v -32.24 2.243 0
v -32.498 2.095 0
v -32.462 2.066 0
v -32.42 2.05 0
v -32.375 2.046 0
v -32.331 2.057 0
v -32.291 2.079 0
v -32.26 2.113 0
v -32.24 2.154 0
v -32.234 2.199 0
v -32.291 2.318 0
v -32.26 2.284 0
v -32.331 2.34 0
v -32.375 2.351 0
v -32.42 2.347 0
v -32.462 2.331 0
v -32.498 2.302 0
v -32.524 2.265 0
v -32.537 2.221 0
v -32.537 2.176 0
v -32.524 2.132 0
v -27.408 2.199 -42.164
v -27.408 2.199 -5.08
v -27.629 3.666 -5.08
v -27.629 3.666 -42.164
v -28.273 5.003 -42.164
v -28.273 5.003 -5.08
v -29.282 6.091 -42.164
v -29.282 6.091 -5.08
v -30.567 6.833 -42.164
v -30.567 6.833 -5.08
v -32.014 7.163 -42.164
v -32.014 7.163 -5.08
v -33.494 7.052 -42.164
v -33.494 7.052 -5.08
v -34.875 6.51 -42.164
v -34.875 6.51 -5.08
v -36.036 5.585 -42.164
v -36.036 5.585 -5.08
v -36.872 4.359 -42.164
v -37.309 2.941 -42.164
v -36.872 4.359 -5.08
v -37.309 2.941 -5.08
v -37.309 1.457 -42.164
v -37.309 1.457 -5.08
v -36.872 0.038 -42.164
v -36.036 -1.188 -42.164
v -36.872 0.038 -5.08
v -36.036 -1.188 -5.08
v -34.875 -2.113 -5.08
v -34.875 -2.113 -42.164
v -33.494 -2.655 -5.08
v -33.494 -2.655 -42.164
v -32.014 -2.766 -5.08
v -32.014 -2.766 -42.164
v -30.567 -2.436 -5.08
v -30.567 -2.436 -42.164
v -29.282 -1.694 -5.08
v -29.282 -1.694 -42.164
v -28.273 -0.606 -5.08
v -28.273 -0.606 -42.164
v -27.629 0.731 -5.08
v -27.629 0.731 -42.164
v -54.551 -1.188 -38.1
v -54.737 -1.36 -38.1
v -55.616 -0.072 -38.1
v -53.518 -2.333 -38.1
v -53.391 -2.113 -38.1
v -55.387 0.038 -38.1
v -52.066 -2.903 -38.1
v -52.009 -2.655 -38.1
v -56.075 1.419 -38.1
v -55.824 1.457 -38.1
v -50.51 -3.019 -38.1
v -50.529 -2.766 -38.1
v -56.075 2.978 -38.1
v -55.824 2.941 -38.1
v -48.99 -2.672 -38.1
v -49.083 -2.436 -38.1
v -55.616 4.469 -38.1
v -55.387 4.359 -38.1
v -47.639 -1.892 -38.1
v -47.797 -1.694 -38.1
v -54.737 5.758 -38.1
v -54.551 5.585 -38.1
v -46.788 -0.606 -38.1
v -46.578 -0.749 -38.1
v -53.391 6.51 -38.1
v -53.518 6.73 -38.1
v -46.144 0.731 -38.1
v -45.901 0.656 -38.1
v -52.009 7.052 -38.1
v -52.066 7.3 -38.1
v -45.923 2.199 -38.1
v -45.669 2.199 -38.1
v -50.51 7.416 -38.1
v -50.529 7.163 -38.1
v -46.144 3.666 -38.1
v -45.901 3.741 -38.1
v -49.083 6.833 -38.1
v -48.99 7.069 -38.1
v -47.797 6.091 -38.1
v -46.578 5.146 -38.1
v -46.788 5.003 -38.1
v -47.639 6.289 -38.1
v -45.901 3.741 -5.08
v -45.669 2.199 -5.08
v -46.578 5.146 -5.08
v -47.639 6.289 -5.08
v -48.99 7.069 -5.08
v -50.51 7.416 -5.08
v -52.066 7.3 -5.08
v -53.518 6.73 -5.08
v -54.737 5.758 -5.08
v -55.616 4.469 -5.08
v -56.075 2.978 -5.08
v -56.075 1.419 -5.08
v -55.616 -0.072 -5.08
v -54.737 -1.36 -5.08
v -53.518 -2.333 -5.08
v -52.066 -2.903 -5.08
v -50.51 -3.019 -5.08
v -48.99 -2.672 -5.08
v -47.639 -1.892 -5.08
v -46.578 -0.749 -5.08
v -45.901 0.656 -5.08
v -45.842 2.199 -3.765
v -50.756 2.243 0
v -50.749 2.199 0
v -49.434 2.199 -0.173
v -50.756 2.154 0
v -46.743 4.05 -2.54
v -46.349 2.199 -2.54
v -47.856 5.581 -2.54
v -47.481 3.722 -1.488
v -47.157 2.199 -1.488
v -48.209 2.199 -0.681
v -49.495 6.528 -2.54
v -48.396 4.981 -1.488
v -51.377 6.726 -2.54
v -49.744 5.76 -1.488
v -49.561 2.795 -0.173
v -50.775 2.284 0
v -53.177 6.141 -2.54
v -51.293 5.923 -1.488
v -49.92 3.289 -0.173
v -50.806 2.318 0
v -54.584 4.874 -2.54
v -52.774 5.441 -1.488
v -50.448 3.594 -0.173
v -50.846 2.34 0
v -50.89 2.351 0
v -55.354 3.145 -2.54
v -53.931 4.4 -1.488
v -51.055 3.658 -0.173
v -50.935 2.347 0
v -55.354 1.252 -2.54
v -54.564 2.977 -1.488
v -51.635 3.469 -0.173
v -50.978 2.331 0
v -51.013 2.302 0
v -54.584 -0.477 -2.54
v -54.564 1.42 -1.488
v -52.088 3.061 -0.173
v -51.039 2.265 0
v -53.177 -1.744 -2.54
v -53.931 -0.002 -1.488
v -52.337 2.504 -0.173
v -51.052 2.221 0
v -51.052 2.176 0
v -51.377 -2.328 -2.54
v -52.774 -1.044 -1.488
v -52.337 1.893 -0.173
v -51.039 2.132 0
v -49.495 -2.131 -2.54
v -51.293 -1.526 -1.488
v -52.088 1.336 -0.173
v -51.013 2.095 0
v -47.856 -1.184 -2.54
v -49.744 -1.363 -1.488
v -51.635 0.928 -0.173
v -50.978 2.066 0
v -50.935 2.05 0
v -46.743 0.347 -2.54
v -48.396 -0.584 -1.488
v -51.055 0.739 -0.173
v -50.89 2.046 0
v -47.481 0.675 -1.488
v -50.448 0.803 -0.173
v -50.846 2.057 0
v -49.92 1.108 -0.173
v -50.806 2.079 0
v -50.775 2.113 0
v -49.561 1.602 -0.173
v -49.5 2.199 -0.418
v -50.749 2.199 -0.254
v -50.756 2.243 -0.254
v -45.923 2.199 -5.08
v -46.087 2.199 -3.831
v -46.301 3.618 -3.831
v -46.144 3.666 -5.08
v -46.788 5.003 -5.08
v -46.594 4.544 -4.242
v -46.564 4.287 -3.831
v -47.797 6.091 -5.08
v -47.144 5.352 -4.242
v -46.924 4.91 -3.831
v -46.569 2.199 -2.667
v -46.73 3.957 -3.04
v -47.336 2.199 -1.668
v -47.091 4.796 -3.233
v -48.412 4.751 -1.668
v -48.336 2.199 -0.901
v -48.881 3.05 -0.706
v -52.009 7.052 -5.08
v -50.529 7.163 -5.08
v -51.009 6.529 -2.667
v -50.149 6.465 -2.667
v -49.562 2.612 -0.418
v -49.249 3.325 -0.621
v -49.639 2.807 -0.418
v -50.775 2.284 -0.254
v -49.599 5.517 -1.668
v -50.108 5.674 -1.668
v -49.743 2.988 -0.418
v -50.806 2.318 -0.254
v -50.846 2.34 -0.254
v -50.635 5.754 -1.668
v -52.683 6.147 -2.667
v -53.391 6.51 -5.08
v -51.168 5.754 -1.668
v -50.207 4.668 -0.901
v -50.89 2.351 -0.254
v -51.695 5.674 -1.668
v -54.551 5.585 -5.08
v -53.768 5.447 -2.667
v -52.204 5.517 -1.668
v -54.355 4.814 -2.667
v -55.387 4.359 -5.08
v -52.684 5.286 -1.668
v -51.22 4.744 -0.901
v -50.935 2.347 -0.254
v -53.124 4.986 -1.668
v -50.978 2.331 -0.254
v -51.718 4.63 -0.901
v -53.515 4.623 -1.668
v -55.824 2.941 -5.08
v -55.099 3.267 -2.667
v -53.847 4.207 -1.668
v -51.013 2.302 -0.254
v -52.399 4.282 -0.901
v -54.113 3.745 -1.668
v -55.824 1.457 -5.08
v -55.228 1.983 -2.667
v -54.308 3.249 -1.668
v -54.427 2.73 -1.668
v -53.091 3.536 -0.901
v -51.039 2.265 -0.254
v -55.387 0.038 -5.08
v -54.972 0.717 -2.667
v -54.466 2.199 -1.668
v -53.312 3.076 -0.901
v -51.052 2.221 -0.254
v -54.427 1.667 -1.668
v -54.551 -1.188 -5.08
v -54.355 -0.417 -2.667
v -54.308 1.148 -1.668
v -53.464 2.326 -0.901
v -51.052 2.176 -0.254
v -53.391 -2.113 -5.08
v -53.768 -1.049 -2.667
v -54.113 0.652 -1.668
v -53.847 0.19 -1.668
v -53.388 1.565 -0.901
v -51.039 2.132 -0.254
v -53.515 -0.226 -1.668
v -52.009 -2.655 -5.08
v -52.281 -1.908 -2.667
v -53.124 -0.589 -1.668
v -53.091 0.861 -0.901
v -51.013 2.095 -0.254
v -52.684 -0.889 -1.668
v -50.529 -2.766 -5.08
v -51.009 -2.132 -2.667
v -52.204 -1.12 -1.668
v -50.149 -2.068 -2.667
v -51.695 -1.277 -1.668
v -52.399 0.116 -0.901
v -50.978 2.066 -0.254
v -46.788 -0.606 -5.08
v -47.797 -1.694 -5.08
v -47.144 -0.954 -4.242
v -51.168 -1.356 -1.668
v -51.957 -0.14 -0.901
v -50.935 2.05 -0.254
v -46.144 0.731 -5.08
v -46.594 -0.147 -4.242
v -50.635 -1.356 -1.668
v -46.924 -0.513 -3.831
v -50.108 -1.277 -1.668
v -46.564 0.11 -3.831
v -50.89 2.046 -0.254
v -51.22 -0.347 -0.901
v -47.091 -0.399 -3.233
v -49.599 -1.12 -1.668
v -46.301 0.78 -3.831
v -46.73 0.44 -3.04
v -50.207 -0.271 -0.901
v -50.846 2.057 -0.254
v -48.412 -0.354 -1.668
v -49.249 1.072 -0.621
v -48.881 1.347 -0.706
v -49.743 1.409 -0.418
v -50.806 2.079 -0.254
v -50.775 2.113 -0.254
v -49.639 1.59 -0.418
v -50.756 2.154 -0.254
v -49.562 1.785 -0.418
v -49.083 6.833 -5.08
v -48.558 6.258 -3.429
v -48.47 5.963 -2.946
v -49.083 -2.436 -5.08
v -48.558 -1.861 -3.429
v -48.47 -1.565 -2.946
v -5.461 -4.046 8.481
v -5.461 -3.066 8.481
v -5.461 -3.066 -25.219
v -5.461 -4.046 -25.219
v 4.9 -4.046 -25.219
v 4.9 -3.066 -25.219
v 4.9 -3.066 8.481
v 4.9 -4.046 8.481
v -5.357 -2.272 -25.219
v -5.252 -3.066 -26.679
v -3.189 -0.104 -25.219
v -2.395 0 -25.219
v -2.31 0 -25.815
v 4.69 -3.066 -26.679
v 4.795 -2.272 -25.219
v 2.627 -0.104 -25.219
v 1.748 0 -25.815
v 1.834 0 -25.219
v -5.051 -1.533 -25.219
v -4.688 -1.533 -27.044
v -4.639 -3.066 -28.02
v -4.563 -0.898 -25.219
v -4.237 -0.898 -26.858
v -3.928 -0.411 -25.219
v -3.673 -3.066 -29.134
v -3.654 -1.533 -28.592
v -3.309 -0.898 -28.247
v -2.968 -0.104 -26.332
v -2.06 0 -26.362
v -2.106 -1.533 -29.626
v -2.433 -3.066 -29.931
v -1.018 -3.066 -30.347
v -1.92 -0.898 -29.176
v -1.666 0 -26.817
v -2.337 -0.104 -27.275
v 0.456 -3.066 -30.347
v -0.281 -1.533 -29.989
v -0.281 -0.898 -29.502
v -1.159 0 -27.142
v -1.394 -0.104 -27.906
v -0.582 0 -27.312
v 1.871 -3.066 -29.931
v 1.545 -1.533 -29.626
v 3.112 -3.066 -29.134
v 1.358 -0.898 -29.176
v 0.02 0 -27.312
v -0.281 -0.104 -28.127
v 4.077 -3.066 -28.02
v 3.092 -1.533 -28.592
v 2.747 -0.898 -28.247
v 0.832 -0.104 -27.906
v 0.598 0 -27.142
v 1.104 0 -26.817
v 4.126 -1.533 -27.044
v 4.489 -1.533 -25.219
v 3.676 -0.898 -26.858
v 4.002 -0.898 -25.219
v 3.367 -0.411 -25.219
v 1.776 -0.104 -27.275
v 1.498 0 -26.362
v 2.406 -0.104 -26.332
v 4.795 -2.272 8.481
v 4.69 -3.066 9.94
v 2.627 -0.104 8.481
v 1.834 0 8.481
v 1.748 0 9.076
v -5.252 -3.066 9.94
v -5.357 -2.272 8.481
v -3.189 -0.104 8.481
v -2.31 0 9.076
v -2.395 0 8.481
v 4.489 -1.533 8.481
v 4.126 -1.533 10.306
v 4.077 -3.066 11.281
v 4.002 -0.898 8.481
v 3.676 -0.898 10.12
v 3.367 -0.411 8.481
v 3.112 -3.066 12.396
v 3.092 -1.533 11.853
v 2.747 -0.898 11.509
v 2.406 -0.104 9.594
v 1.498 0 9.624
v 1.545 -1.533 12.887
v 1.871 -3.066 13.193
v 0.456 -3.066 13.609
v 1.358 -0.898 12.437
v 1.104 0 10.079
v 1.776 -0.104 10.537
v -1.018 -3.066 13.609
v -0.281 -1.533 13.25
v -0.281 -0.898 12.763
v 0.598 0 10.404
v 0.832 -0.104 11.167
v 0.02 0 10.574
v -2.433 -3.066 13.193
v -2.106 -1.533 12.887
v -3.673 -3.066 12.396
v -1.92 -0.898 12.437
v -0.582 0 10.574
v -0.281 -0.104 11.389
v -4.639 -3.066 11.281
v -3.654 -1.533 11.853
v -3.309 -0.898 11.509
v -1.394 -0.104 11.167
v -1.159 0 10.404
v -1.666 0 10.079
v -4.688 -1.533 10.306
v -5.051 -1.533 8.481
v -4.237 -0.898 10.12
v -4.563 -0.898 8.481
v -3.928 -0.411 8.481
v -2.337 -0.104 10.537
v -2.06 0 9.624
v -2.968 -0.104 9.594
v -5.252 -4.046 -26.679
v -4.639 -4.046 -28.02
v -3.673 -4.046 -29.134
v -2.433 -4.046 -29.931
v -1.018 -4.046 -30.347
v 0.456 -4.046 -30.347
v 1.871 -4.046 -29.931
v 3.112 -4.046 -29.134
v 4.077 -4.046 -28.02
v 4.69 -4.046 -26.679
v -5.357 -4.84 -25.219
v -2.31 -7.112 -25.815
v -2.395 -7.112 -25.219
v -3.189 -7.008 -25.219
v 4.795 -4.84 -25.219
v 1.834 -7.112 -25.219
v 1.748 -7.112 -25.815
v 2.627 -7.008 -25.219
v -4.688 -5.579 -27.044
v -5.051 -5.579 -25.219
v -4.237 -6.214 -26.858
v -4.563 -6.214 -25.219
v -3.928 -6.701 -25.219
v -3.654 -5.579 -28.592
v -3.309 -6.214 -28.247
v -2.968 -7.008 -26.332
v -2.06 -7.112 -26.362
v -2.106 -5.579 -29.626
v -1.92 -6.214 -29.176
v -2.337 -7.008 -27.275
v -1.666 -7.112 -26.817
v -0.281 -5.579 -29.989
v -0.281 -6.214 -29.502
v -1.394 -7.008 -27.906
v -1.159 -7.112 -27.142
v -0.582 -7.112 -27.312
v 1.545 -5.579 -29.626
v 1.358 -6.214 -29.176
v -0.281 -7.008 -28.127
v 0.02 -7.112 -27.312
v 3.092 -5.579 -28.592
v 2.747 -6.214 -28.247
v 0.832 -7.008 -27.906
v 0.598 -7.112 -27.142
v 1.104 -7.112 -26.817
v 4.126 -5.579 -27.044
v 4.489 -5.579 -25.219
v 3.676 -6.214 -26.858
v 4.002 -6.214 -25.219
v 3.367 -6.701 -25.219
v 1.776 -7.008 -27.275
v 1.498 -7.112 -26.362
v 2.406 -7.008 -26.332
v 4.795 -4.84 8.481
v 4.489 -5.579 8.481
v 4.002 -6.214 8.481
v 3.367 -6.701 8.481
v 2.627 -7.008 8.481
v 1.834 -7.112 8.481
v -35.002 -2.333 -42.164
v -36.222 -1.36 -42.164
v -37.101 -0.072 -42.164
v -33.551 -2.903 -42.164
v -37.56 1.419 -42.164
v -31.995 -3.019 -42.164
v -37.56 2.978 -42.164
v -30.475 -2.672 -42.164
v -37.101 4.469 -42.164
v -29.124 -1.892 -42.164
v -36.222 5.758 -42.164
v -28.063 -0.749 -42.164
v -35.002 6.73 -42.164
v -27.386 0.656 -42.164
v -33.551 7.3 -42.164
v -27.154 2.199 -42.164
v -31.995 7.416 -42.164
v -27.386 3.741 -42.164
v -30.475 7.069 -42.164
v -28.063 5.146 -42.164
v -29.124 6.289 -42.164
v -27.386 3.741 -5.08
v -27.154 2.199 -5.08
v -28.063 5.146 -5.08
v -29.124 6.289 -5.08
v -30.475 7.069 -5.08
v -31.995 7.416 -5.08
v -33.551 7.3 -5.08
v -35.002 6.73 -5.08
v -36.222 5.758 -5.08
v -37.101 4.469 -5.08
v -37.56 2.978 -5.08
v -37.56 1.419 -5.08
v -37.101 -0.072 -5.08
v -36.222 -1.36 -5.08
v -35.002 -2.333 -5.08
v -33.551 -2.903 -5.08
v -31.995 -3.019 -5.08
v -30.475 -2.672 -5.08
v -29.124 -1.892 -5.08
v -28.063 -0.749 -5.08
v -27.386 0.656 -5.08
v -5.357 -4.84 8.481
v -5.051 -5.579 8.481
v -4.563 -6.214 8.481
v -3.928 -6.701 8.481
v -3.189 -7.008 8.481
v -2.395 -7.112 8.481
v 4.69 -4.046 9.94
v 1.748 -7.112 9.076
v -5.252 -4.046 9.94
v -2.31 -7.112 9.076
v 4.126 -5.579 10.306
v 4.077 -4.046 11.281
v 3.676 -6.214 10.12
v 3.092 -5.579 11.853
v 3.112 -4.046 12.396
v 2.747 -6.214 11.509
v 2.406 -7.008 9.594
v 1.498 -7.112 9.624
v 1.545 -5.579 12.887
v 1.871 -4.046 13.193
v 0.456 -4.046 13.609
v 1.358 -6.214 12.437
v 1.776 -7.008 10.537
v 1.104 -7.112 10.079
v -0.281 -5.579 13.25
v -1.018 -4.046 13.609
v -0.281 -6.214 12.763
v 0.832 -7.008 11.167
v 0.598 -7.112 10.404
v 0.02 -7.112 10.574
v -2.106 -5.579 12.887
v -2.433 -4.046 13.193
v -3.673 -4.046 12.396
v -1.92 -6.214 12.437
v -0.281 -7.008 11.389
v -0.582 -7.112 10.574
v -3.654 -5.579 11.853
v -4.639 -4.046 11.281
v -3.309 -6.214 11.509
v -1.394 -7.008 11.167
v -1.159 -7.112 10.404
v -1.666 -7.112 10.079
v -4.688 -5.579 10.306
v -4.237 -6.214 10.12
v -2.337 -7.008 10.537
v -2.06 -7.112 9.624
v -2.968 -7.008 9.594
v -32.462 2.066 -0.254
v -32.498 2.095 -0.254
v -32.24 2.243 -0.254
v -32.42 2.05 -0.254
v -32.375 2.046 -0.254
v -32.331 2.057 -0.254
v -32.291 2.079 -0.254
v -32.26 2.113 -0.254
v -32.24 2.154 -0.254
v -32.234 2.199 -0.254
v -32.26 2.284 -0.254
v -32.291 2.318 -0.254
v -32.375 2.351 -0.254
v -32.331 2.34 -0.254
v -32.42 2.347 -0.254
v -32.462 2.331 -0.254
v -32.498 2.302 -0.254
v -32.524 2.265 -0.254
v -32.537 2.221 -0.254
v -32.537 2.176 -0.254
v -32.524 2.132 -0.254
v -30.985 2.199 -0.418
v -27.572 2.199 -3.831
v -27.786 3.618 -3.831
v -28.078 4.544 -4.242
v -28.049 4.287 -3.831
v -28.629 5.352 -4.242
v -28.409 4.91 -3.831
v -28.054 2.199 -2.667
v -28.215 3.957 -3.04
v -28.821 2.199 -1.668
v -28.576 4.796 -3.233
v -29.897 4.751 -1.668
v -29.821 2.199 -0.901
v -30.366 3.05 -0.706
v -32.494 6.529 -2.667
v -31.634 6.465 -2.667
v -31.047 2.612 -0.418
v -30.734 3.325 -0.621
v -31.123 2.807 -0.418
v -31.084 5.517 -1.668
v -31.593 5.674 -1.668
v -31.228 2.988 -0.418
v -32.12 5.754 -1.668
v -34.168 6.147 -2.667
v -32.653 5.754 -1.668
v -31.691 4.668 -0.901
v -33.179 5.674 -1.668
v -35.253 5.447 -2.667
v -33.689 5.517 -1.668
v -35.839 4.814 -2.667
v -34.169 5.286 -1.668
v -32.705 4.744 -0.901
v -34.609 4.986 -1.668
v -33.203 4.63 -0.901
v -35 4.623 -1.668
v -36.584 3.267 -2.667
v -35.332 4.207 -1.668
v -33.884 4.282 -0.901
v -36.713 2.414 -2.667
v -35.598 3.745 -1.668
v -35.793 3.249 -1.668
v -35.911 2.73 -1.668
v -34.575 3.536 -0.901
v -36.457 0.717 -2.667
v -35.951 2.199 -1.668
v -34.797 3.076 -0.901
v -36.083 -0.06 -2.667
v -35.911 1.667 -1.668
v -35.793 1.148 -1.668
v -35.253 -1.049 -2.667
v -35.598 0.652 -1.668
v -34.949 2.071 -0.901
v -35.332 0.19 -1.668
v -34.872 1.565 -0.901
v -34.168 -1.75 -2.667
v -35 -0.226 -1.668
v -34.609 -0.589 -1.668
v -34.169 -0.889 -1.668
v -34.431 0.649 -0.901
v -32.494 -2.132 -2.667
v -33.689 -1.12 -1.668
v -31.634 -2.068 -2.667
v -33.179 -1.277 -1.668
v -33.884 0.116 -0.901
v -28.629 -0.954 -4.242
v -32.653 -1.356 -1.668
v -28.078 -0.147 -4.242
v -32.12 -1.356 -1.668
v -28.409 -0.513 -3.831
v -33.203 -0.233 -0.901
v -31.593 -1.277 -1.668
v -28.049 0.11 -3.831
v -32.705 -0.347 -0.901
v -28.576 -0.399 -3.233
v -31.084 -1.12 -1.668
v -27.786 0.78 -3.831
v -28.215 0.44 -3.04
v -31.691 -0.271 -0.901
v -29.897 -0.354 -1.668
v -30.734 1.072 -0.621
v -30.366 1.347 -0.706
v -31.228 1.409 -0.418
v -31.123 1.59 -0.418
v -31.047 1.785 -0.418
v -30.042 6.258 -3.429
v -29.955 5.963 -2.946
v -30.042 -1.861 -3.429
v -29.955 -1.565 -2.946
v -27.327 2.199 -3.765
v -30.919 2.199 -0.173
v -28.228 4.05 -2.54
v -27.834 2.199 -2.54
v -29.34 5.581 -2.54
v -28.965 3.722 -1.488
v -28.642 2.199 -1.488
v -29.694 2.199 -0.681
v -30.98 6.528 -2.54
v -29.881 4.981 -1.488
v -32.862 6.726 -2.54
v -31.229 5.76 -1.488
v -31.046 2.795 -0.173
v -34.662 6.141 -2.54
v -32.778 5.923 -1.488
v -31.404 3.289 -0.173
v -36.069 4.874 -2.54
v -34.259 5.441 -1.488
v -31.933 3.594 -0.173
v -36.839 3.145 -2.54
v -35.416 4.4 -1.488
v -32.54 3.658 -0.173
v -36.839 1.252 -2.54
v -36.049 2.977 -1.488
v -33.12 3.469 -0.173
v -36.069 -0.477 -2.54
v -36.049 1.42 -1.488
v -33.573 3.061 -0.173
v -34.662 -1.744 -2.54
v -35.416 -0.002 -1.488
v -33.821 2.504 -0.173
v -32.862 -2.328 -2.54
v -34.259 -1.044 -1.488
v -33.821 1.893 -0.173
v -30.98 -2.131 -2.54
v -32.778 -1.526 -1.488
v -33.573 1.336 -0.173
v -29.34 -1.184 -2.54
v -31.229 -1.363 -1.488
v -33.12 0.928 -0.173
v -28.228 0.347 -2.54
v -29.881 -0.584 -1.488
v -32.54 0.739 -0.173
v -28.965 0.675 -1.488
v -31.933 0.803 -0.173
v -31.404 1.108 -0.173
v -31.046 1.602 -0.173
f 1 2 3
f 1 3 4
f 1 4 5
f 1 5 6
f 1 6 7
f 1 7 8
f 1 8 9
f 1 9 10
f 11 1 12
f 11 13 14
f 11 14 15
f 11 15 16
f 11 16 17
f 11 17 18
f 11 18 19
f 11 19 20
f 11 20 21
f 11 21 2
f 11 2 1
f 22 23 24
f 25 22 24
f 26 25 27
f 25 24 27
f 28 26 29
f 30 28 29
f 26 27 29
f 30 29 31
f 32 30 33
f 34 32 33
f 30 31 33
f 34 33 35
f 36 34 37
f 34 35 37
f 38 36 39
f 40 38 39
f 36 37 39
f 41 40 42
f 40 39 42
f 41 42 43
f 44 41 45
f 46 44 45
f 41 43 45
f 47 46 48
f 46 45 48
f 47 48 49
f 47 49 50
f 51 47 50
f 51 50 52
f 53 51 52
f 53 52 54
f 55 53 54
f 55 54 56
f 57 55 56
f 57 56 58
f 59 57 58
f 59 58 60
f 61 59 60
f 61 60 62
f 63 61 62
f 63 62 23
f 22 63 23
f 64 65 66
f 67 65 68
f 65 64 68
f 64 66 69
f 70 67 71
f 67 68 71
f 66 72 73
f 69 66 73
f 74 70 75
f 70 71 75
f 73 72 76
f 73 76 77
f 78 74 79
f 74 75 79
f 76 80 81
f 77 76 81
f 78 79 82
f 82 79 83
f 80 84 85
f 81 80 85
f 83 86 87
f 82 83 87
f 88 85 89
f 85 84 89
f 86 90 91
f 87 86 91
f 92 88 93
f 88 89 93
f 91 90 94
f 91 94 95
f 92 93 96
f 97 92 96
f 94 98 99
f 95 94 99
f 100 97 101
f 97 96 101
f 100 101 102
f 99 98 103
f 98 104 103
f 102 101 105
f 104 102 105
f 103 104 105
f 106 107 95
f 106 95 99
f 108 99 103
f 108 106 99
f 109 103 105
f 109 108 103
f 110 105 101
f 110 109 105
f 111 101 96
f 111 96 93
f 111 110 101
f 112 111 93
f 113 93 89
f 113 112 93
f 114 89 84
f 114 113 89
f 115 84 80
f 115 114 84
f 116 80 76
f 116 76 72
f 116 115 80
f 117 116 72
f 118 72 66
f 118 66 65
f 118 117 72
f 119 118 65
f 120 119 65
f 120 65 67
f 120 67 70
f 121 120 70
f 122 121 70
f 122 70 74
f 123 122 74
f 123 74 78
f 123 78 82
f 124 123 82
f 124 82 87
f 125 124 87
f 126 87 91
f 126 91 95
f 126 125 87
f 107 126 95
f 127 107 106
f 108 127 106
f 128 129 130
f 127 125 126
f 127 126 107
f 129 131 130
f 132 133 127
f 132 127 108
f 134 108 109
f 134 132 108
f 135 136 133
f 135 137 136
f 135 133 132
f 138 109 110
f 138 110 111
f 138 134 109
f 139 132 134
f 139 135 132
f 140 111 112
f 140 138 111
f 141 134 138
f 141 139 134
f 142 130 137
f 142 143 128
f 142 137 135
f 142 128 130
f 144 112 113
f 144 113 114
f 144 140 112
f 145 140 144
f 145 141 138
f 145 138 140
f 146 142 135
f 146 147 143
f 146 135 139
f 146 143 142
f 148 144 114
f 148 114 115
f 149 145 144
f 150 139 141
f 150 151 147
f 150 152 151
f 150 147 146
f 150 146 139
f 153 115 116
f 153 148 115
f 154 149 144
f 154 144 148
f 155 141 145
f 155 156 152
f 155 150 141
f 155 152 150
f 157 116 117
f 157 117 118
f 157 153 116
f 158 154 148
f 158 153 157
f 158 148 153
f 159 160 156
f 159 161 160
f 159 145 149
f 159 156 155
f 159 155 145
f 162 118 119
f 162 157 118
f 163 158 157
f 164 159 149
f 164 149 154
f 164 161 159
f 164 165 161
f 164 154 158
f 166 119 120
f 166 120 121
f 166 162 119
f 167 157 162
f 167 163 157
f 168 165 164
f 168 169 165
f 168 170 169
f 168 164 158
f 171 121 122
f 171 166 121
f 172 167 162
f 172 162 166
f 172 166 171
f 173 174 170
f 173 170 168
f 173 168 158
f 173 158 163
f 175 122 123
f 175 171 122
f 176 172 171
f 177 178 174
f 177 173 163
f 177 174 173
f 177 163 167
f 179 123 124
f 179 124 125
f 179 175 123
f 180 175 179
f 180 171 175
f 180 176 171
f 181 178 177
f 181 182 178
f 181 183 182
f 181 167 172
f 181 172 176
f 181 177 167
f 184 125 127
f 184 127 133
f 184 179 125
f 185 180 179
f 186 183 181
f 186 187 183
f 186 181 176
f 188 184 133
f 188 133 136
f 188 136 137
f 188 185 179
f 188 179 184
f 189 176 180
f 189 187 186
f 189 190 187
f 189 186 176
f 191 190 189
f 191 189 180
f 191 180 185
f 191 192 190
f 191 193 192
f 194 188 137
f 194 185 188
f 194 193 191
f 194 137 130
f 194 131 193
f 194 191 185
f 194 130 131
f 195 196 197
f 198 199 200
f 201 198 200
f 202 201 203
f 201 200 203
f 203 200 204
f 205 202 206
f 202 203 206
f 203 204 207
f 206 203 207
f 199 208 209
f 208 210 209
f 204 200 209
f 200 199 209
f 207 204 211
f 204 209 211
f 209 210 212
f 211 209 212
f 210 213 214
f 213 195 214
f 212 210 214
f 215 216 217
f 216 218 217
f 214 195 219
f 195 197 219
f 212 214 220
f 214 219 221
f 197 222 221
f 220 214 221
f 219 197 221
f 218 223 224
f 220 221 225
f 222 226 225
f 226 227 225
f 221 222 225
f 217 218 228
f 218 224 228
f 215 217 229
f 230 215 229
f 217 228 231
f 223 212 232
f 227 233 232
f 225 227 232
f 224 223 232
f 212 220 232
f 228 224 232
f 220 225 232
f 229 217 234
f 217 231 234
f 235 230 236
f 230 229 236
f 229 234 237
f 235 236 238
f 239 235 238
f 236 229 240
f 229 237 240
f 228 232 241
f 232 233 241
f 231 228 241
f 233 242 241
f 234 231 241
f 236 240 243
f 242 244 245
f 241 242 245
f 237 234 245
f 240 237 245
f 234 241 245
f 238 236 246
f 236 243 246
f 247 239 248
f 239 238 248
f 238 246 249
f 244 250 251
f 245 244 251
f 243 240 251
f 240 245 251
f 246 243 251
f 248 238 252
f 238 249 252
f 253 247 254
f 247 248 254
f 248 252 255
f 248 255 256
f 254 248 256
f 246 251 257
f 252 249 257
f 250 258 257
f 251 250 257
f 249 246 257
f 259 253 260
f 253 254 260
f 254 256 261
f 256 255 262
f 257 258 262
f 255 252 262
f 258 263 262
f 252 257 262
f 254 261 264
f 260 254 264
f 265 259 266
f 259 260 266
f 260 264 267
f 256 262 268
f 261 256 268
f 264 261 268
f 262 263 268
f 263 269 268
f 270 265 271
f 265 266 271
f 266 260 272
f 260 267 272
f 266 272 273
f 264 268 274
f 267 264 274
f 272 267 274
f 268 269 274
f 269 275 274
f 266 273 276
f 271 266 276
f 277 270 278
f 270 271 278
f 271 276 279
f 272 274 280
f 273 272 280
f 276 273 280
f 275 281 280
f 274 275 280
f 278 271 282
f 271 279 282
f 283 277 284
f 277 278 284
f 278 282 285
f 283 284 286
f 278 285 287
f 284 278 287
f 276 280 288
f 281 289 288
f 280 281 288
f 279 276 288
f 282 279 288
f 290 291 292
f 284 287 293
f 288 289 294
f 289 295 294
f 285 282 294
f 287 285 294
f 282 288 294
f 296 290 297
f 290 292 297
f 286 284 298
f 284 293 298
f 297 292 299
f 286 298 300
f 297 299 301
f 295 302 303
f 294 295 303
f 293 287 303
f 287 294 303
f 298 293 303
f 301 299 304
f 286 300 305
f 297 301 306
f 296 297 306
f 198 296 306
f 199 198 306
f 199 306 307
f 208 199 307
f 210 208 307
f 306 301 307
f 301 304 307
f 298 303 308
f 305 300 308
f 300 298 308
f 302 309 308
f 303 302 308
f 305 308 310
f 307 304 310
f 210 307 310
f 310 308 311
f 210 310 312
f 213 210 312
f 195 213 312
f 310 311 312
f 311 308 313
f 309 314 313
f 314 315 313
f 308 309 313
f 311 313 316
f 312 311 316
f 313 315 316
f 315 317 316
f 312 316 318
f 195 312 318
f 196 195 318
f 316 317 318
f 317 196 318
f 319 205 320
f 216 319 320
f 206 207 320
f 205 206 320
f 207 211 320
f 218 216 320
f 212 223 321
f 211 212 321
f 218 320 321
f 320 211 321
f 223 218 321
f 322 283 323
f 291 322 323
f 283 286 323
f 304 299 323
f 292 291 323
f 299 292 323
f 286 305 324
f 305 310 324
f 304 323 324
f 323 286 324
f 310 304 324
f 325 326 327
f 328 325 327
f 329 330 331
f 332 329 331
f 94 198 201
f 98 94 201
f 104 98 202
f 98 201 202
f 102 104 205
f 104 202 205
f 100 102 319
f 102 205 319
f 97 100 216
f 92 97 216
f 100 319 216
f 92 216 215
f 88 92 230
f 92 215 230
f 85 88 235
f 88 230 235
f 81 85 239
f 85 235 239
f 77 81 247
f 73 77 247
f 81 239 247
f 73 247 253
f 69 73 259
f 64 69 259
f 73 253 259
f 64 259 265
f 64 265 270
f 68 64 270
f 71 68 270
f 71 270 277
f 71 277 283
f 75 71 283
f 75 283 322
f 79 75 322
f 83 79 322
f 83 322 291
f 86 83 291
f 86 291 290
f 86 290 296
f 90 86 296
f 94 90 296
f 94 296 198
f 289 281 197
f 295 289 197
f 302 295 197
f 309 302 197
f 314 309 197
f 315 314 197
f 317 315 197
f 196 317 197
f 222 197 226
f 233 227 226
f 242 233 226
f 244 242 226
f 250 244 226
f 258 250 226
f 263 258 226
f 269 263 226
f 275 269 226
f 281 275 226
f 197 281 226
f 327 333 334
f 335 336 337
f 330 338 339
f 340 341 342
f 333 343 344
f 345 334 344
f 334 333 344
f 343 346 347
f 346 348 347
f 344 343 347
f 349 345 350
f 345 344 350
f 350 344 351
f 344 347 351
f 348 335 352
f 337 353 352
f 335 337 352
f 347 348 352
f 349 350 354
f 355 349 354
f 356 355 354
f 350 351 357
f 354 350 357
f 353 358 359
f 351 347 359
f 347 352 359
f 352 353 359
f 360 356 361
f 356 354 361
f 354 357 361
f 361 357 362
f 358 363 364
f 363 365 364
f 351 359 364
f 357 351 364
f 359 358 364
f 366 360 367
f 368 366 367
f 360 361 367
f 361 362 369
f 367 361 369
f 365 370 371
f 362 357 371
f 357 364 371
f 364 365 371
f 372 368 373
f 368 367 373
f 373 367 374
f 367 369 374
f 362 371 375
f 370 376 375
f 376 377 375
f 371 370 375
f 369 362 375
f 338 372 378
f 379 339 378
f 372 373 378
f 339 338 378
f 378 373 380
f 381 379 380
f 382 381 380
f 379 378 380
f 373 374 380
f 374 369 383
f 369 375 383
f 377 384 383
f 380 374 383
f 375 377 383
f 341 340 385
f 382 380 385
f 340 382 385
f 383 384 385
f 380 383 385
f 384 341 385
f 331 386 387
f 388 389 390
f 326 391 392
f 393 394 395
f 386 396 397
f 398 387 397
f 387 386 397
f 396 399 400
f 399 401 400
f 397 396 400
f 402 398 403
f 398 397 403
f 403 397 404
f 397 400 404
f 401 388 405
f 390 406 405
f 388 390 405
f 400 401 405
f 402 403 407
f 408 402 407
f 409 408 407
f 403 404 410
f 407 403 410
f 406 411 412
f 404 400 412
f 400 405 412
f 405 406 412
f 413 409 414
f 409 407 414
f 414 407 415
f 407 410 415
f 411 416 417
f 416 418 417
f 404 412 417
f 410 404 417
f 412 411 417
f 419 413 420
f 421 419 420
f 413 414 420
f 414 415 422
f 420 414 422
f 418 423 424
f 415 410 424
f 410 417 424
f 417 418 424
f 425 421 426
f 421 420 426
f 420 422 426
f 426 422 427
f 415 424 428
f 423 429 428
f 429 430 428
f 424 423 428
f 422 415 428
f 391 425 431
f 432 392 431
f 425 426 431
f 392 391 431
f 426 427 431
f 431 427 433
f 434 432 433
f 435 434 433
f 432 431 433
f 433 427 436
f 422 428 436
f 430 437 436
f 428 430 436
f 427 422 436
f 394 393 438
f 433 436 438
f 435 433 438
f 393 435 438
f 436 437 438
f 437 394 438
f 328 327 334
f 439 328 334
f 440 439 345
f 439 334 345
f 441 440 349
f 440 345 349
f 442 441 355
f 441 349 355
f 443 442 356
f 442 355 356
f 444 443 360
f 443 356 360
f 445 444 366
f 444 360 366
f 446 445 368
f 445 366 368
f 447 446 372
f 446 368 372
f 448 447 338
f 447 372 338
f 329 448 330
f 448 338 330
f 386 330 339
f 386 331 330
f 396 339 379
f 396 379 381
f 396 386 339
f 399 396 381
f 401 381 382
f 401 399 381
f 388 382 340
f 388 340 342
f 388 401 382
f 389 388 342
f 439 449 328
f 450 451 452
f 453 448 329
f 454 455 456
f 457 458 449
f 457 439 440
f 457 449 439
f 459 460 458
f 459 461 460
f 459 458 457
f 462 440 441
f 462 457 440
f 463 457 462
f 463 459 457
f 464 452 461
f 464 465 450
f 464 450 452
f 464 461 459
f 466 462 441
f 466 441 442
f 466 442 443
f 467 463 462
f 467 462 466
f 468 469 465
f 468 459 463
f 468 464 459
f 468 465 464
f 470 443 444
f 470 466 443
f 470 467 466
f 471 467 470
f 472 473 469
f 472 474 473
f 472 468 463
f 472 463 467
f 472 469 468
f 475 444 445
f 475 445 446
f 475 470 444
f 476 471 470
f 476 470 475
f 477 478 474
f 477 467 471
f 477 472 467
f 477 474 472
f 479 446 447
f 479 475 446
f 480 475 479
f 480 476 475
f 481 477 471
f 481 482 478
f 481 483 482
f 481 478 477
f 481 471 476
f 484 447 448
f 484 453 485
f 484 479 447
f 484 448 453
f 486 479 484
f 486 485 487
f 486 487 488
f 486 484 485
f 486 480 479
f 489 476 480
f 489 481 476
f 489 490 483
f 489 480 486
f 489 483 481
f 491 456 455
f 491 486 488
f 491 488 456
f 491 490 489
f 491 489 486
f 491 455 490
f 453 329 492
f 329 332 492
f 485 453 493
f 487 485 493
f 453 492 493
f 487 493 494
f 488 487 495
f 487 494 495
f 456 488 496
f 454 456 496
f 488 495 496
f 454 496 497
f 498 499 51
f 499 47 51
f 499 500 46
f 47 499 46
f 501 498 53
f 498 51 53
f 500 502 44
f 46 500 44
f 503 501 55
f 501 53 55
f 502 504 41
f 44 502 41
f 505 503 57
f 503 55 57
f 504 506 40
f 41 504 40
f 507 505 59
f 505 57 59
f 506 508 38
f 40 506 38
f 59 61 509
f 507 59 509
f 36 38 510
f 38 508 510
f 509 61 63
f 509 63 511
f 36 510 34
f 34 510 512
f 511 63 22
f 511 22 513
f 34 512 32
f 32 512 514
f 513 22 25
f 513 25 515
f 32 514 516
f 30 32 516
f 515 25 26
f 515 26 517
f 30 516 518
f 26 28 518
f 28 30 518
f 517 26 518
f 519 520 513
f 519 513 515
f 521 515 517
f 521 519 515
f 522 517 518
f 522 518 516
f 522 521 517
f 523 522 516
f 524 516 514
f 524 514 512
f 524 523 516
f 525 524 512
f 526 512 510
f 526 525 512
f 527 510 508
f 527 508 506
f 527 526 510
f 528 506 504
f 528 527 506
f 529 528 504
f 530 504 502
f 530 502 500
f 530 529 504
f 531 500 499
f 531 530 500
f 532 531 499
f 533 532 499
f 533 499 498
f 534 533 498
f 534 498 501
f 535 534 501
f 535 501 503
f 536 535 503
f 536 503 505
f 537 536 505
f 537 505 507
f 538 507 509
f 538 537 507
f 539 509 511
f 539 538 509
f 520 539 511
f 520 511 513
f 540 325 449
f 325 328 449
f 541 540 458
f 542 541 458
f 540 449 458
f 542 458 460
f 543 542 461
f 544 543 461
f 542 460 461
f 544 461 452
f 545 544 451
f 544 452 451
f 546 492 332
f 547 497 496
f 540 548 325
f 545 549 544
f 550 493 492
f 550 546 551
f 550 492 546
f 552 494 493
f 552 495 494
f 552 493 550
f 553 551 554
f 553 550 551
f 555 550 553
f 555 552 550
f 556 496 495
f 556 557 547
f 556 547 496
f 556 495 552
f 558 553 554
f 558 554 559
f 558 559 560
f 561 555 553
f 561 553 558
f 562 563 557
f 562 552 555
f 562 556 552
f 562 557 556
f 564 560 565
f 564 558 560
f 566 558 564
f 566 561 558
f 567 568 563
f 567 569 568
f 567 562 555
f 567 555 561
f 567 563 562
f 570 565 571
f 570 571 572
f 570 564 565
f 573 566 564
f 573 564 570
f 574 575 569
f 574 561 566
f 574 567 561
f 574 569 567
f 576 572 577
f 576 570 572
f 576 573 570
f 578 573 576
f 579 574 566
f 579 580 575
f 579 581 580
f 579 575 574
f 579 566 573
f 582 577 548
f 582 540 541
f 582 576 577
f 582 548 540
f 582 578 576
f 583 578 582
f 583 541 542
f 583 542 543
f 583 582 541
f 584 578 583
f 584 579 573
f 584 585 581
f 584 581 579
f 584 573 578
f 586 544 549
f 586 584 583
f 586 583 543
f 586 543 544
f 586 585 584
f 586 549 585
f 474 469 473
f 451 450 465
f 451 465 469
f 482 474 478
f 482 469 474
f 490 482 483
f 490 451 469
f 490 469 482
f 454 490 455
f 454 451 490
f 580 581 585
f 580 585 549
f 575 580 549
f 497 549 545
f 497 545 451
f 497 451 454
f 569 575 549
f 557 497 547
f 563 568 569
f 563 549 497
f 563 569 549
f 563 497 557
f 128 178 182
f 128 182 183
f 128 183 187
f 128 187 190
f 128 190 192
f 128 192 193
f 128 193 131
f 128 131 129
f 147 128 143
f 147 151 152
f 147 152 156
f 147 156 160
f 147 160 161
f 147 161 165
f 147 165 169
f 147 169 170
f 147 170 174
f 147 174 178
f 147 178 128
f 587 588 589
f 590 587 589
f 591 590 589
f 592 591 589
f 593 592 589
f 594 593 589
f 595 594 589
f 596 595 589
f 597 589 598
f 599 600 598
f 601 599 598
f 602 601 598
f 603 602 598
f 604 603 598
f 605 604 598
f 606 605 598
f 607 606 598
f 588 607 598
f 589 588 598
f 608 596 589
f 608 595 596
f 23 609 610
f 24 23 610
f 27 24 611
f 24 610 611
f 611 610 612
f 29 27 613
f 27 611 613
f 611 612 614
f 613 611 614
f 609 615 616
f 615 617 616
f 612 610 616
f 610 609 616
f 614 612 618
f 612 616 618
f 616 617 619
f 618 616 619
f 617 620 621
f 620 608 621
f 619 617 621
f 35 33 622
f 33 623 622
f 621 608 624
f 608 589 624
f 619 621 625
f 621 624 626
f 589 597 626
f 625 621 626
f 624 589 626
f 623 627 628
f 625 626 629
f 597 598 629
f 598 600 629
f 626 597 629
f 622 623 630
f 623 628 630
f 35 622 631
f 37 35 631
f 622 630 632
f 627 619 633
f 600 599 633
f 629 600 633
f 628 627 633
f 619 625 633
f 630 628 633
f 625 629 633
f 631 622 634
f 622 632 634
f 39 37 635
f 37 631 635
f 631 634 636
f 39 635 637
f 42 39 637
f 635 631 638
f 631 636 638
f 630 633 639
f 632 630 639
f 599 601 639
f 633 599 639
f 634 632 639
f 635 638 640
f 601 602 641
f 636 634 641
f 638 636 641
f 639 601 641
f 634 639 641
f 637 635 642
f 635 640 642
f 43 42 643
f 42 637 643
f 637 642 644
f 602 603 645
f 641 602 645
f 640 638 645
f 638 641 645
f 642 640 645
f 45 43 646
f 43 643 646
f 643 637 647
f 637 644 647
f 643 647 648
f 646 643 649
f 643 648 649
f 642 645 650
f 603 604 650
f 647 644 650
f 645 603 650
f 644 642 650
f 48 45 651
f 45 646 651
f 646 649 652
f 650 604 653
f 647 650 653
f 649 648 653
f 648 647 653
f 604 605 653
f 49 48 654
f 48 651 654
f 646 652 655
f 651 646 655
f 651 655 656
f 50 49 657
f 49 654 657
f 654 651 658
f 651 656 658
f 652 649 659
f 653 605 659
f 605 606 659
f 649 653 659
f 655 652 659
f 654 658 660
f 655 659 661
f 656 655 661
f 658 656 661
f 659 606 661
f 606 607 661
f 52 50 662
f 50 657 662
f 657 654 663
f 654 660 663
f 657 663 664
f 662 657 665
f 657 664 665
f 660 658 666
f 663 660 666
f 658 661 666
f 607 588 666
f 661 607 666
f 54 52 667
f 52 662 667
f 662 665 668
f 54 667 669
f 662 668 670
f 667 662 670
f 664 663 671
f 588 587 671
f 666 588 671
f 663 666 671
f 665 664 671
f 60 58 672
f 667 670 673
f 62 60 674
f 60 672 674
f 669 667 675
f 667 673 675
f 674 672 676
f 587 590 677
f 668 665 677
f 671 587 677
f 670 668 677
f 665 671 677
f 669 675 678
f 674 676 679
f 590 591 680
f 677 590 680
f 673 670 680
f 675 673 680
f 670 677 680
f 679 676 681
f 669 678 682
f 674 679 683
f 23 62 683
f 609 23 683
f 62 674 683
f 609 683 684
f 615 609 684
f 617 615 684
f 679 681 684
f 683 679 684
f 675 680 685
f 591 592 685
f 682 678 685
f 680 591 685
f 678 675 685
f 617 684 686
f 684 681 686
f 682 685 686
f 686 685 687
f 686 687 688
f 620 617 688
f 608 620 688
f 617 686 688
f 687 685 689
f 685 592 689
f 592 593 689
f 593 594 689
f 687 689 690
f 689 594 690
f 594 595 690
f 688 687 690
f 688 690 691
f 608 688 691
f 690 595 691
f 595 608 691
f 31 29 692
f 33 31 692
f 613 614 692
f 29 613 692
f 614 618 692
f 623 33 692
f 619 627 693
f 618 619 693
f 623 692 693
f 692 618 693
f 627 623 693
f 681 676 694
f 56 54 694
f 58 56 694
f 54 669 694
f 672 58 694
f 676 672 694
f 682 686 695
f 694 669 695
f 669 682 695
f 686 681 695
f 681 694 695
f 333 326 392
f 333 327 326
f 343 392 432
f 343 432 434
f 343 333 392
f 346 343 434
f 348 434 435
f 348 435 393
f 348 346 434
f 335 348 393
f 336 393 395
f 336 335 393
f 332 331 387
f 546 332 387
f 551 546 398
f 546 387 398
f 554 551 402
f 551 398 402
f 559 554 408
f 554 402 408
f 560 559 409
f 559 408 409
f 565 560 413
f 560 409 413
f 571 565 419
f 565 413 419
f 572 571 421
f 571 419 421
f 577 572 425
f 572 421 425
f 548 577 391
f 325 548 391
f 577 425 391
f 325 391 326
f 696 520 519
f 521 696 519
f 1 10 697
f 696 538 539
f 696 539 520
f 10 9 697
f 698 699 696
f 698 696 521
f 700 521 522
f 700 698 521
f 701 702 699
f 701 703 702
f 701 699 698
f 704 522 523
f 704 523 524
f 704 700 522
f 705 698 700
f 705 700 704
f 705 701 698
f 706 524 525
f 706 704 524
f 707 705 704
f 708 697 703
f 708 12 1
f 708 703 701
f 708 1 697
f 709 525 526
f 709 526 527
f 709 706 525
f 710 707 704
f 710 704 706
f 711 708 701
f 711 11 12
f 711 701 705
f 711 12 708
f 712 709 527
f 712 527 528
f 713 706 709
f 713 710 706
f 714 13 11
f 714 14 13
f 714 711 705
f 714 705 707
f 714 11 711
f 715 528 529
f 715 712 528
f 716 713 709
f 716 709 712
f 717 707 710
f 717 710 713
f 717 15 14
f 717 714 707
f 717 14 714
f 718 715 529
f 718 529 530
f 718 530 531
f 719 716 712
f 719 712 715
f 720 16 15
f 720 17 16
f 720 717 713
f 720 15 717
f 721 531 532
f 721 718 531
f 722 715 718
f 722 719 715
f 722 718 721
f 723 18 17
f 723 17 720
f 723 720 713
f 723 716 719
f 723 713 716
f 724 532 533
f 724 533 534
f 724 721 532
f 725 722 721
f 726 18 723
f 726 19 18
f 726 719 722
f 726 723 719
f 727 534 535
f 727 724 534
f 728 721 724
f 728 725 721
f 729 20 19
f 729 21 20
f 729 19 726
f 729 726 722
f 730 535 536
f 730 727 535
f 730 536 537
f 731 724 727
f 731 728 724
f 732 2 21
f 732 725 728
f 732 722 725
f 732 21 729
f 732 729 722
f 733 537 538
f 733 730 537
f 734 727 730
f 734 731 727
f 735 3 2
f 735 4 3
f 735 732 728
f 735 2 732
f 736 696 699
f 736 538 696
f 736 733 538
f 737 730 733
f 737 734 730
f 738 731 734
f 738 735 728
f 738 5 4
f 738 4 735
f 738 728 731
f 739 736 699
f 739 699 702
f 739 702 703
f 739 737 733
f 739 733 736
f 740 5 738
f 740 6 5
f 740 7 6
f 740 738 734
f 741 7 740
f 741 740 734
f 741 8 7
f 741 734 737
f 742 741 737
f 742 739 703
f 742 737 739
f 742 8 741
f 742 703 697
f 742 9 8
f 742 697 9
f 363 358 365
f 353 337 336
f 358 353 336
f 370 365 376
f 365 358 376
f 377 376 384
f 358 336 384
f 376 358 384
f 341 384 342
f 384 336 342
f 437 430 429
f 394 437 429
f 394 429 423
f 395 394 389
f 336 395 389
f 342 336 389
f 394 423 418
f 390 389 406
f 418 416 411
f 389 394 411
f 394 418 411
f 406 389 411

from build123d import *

# Parameters (mm, degrees)
F1_DEPTH = 7.112
F2_R     = 3.066051
F3_R     = 5.232497
F4_DEPTH = 42.164
F5_R     = 5.08
F6_T     = -0.254
F7_DEPTH = 38.1
F8_R     = 5.08
F9_T     = -0.254


with BuildPart() as f1:
    # F0 (on Front) → F1 (new body)
    with BuildSketch(Plane.XZ):
        with BuildLine():
            Line((-5.461434, 8.480641), (-5.461434, -6.32129))
            ThreePointArc((-5.461434, -6.32129), (-0.28081, -1.140666), (4.899814, -6.32129))
            Line((4.899814, -6.32129), (4.899814, 0.661517))
            Line((4.899814, 0.661517), (4.899814, 8.480641))
            ThreePointArc((4.899814, 8.480641), (-0.28081, 13.661265), (-5.461434, 8.480641))
        make_face()
        with BuildLine():
            ThreePointArc((4.899814, -6.32129), (-0.28081, -1.140666), (-5.461434, -6.32129))
            Line((-5.461434, -6.32129), (4.899814, -6.32129))
        make_face()
        with BuildLine():
            Line((4.899814, -6.32129), (-5.461434, -6.32129))
            ThreePointArc((-5.461434, -6.32129), (-0.28081, -11.501914), (4.899814, -6.32129))
        make_face()
        with BuildLine():
            Line((-5.461434, -6.32129), (-5.461434, -25.218987))
            ThreePointArc((-5.461434, -25.218987), (-0.28081, -30.399612), (4.899814, -25.218987))
            Line((4.899814, -25.218987), (4.899814, -6.32129))
            ThreePointArc((4.899814, -6.32129), (-0.28081, -11.501914), (-5.461434, -6.32129))
        make_face()
    extrude(amount=F1_DEPTH)

    # F2
    f2_edges = [f1.edges().sort_by_distance(p)[0] for p in [
        (4.899814, -7.112, -8.369173),
        (4.899814, 0, -8.369173),
        (-5.461434, 0, -8.369173),
    ]]
    fillet(f2_edges, radius=F2_R)


with BuildPart() as f4:
    # F3 (on Top) → F4 (new body)
    with BuildSketch(Plane.XY):
        with Locations((-32.386214, 2.198541)):
            Circle(F3_R)
    extrude(amount=-F4_DEPTH)

    # F5
    f5_edges = [f4.edges().sort_by_distance(p)[0] for p in [
        (-37.618711, 2.198541, 0),
    ]]
    fillet(f5_edges, radius=F5_R)

    # F6
    f6_openings = [f4.faces().sort_by_distance(p)[0] for p in [
        (-32.386214, 2.198541, -42.164),
    ]]
    offset(amount=F6_T, openings=f6_openings)


with BuildPart() as f7:
    # F3 (on Top) → F7 (new body)
    with BuildSketch(Plane.XY):
        with Locations((-50.901392, 2.198541)):
            Circle(F3_R)
    extrude(amount=-F7_DEPTH)

    # F8
    f8_edges = [f7.edges().sort_by_distance(p)[0] for p in [
        (-56.13389, 2.198541, 0),
    ]]
    fillet(f8_edges, radius=F8_R)

    # F9
    f9_openings = [f7.faces().sort_by_distance(p)[0] for p in [
        (-50.901392, 2.198541, -38.1),
    ]]
    offset(amount=F9_T, openings=f9_openings)


solid = Compound([f1.part, f4.part, f7.part])
